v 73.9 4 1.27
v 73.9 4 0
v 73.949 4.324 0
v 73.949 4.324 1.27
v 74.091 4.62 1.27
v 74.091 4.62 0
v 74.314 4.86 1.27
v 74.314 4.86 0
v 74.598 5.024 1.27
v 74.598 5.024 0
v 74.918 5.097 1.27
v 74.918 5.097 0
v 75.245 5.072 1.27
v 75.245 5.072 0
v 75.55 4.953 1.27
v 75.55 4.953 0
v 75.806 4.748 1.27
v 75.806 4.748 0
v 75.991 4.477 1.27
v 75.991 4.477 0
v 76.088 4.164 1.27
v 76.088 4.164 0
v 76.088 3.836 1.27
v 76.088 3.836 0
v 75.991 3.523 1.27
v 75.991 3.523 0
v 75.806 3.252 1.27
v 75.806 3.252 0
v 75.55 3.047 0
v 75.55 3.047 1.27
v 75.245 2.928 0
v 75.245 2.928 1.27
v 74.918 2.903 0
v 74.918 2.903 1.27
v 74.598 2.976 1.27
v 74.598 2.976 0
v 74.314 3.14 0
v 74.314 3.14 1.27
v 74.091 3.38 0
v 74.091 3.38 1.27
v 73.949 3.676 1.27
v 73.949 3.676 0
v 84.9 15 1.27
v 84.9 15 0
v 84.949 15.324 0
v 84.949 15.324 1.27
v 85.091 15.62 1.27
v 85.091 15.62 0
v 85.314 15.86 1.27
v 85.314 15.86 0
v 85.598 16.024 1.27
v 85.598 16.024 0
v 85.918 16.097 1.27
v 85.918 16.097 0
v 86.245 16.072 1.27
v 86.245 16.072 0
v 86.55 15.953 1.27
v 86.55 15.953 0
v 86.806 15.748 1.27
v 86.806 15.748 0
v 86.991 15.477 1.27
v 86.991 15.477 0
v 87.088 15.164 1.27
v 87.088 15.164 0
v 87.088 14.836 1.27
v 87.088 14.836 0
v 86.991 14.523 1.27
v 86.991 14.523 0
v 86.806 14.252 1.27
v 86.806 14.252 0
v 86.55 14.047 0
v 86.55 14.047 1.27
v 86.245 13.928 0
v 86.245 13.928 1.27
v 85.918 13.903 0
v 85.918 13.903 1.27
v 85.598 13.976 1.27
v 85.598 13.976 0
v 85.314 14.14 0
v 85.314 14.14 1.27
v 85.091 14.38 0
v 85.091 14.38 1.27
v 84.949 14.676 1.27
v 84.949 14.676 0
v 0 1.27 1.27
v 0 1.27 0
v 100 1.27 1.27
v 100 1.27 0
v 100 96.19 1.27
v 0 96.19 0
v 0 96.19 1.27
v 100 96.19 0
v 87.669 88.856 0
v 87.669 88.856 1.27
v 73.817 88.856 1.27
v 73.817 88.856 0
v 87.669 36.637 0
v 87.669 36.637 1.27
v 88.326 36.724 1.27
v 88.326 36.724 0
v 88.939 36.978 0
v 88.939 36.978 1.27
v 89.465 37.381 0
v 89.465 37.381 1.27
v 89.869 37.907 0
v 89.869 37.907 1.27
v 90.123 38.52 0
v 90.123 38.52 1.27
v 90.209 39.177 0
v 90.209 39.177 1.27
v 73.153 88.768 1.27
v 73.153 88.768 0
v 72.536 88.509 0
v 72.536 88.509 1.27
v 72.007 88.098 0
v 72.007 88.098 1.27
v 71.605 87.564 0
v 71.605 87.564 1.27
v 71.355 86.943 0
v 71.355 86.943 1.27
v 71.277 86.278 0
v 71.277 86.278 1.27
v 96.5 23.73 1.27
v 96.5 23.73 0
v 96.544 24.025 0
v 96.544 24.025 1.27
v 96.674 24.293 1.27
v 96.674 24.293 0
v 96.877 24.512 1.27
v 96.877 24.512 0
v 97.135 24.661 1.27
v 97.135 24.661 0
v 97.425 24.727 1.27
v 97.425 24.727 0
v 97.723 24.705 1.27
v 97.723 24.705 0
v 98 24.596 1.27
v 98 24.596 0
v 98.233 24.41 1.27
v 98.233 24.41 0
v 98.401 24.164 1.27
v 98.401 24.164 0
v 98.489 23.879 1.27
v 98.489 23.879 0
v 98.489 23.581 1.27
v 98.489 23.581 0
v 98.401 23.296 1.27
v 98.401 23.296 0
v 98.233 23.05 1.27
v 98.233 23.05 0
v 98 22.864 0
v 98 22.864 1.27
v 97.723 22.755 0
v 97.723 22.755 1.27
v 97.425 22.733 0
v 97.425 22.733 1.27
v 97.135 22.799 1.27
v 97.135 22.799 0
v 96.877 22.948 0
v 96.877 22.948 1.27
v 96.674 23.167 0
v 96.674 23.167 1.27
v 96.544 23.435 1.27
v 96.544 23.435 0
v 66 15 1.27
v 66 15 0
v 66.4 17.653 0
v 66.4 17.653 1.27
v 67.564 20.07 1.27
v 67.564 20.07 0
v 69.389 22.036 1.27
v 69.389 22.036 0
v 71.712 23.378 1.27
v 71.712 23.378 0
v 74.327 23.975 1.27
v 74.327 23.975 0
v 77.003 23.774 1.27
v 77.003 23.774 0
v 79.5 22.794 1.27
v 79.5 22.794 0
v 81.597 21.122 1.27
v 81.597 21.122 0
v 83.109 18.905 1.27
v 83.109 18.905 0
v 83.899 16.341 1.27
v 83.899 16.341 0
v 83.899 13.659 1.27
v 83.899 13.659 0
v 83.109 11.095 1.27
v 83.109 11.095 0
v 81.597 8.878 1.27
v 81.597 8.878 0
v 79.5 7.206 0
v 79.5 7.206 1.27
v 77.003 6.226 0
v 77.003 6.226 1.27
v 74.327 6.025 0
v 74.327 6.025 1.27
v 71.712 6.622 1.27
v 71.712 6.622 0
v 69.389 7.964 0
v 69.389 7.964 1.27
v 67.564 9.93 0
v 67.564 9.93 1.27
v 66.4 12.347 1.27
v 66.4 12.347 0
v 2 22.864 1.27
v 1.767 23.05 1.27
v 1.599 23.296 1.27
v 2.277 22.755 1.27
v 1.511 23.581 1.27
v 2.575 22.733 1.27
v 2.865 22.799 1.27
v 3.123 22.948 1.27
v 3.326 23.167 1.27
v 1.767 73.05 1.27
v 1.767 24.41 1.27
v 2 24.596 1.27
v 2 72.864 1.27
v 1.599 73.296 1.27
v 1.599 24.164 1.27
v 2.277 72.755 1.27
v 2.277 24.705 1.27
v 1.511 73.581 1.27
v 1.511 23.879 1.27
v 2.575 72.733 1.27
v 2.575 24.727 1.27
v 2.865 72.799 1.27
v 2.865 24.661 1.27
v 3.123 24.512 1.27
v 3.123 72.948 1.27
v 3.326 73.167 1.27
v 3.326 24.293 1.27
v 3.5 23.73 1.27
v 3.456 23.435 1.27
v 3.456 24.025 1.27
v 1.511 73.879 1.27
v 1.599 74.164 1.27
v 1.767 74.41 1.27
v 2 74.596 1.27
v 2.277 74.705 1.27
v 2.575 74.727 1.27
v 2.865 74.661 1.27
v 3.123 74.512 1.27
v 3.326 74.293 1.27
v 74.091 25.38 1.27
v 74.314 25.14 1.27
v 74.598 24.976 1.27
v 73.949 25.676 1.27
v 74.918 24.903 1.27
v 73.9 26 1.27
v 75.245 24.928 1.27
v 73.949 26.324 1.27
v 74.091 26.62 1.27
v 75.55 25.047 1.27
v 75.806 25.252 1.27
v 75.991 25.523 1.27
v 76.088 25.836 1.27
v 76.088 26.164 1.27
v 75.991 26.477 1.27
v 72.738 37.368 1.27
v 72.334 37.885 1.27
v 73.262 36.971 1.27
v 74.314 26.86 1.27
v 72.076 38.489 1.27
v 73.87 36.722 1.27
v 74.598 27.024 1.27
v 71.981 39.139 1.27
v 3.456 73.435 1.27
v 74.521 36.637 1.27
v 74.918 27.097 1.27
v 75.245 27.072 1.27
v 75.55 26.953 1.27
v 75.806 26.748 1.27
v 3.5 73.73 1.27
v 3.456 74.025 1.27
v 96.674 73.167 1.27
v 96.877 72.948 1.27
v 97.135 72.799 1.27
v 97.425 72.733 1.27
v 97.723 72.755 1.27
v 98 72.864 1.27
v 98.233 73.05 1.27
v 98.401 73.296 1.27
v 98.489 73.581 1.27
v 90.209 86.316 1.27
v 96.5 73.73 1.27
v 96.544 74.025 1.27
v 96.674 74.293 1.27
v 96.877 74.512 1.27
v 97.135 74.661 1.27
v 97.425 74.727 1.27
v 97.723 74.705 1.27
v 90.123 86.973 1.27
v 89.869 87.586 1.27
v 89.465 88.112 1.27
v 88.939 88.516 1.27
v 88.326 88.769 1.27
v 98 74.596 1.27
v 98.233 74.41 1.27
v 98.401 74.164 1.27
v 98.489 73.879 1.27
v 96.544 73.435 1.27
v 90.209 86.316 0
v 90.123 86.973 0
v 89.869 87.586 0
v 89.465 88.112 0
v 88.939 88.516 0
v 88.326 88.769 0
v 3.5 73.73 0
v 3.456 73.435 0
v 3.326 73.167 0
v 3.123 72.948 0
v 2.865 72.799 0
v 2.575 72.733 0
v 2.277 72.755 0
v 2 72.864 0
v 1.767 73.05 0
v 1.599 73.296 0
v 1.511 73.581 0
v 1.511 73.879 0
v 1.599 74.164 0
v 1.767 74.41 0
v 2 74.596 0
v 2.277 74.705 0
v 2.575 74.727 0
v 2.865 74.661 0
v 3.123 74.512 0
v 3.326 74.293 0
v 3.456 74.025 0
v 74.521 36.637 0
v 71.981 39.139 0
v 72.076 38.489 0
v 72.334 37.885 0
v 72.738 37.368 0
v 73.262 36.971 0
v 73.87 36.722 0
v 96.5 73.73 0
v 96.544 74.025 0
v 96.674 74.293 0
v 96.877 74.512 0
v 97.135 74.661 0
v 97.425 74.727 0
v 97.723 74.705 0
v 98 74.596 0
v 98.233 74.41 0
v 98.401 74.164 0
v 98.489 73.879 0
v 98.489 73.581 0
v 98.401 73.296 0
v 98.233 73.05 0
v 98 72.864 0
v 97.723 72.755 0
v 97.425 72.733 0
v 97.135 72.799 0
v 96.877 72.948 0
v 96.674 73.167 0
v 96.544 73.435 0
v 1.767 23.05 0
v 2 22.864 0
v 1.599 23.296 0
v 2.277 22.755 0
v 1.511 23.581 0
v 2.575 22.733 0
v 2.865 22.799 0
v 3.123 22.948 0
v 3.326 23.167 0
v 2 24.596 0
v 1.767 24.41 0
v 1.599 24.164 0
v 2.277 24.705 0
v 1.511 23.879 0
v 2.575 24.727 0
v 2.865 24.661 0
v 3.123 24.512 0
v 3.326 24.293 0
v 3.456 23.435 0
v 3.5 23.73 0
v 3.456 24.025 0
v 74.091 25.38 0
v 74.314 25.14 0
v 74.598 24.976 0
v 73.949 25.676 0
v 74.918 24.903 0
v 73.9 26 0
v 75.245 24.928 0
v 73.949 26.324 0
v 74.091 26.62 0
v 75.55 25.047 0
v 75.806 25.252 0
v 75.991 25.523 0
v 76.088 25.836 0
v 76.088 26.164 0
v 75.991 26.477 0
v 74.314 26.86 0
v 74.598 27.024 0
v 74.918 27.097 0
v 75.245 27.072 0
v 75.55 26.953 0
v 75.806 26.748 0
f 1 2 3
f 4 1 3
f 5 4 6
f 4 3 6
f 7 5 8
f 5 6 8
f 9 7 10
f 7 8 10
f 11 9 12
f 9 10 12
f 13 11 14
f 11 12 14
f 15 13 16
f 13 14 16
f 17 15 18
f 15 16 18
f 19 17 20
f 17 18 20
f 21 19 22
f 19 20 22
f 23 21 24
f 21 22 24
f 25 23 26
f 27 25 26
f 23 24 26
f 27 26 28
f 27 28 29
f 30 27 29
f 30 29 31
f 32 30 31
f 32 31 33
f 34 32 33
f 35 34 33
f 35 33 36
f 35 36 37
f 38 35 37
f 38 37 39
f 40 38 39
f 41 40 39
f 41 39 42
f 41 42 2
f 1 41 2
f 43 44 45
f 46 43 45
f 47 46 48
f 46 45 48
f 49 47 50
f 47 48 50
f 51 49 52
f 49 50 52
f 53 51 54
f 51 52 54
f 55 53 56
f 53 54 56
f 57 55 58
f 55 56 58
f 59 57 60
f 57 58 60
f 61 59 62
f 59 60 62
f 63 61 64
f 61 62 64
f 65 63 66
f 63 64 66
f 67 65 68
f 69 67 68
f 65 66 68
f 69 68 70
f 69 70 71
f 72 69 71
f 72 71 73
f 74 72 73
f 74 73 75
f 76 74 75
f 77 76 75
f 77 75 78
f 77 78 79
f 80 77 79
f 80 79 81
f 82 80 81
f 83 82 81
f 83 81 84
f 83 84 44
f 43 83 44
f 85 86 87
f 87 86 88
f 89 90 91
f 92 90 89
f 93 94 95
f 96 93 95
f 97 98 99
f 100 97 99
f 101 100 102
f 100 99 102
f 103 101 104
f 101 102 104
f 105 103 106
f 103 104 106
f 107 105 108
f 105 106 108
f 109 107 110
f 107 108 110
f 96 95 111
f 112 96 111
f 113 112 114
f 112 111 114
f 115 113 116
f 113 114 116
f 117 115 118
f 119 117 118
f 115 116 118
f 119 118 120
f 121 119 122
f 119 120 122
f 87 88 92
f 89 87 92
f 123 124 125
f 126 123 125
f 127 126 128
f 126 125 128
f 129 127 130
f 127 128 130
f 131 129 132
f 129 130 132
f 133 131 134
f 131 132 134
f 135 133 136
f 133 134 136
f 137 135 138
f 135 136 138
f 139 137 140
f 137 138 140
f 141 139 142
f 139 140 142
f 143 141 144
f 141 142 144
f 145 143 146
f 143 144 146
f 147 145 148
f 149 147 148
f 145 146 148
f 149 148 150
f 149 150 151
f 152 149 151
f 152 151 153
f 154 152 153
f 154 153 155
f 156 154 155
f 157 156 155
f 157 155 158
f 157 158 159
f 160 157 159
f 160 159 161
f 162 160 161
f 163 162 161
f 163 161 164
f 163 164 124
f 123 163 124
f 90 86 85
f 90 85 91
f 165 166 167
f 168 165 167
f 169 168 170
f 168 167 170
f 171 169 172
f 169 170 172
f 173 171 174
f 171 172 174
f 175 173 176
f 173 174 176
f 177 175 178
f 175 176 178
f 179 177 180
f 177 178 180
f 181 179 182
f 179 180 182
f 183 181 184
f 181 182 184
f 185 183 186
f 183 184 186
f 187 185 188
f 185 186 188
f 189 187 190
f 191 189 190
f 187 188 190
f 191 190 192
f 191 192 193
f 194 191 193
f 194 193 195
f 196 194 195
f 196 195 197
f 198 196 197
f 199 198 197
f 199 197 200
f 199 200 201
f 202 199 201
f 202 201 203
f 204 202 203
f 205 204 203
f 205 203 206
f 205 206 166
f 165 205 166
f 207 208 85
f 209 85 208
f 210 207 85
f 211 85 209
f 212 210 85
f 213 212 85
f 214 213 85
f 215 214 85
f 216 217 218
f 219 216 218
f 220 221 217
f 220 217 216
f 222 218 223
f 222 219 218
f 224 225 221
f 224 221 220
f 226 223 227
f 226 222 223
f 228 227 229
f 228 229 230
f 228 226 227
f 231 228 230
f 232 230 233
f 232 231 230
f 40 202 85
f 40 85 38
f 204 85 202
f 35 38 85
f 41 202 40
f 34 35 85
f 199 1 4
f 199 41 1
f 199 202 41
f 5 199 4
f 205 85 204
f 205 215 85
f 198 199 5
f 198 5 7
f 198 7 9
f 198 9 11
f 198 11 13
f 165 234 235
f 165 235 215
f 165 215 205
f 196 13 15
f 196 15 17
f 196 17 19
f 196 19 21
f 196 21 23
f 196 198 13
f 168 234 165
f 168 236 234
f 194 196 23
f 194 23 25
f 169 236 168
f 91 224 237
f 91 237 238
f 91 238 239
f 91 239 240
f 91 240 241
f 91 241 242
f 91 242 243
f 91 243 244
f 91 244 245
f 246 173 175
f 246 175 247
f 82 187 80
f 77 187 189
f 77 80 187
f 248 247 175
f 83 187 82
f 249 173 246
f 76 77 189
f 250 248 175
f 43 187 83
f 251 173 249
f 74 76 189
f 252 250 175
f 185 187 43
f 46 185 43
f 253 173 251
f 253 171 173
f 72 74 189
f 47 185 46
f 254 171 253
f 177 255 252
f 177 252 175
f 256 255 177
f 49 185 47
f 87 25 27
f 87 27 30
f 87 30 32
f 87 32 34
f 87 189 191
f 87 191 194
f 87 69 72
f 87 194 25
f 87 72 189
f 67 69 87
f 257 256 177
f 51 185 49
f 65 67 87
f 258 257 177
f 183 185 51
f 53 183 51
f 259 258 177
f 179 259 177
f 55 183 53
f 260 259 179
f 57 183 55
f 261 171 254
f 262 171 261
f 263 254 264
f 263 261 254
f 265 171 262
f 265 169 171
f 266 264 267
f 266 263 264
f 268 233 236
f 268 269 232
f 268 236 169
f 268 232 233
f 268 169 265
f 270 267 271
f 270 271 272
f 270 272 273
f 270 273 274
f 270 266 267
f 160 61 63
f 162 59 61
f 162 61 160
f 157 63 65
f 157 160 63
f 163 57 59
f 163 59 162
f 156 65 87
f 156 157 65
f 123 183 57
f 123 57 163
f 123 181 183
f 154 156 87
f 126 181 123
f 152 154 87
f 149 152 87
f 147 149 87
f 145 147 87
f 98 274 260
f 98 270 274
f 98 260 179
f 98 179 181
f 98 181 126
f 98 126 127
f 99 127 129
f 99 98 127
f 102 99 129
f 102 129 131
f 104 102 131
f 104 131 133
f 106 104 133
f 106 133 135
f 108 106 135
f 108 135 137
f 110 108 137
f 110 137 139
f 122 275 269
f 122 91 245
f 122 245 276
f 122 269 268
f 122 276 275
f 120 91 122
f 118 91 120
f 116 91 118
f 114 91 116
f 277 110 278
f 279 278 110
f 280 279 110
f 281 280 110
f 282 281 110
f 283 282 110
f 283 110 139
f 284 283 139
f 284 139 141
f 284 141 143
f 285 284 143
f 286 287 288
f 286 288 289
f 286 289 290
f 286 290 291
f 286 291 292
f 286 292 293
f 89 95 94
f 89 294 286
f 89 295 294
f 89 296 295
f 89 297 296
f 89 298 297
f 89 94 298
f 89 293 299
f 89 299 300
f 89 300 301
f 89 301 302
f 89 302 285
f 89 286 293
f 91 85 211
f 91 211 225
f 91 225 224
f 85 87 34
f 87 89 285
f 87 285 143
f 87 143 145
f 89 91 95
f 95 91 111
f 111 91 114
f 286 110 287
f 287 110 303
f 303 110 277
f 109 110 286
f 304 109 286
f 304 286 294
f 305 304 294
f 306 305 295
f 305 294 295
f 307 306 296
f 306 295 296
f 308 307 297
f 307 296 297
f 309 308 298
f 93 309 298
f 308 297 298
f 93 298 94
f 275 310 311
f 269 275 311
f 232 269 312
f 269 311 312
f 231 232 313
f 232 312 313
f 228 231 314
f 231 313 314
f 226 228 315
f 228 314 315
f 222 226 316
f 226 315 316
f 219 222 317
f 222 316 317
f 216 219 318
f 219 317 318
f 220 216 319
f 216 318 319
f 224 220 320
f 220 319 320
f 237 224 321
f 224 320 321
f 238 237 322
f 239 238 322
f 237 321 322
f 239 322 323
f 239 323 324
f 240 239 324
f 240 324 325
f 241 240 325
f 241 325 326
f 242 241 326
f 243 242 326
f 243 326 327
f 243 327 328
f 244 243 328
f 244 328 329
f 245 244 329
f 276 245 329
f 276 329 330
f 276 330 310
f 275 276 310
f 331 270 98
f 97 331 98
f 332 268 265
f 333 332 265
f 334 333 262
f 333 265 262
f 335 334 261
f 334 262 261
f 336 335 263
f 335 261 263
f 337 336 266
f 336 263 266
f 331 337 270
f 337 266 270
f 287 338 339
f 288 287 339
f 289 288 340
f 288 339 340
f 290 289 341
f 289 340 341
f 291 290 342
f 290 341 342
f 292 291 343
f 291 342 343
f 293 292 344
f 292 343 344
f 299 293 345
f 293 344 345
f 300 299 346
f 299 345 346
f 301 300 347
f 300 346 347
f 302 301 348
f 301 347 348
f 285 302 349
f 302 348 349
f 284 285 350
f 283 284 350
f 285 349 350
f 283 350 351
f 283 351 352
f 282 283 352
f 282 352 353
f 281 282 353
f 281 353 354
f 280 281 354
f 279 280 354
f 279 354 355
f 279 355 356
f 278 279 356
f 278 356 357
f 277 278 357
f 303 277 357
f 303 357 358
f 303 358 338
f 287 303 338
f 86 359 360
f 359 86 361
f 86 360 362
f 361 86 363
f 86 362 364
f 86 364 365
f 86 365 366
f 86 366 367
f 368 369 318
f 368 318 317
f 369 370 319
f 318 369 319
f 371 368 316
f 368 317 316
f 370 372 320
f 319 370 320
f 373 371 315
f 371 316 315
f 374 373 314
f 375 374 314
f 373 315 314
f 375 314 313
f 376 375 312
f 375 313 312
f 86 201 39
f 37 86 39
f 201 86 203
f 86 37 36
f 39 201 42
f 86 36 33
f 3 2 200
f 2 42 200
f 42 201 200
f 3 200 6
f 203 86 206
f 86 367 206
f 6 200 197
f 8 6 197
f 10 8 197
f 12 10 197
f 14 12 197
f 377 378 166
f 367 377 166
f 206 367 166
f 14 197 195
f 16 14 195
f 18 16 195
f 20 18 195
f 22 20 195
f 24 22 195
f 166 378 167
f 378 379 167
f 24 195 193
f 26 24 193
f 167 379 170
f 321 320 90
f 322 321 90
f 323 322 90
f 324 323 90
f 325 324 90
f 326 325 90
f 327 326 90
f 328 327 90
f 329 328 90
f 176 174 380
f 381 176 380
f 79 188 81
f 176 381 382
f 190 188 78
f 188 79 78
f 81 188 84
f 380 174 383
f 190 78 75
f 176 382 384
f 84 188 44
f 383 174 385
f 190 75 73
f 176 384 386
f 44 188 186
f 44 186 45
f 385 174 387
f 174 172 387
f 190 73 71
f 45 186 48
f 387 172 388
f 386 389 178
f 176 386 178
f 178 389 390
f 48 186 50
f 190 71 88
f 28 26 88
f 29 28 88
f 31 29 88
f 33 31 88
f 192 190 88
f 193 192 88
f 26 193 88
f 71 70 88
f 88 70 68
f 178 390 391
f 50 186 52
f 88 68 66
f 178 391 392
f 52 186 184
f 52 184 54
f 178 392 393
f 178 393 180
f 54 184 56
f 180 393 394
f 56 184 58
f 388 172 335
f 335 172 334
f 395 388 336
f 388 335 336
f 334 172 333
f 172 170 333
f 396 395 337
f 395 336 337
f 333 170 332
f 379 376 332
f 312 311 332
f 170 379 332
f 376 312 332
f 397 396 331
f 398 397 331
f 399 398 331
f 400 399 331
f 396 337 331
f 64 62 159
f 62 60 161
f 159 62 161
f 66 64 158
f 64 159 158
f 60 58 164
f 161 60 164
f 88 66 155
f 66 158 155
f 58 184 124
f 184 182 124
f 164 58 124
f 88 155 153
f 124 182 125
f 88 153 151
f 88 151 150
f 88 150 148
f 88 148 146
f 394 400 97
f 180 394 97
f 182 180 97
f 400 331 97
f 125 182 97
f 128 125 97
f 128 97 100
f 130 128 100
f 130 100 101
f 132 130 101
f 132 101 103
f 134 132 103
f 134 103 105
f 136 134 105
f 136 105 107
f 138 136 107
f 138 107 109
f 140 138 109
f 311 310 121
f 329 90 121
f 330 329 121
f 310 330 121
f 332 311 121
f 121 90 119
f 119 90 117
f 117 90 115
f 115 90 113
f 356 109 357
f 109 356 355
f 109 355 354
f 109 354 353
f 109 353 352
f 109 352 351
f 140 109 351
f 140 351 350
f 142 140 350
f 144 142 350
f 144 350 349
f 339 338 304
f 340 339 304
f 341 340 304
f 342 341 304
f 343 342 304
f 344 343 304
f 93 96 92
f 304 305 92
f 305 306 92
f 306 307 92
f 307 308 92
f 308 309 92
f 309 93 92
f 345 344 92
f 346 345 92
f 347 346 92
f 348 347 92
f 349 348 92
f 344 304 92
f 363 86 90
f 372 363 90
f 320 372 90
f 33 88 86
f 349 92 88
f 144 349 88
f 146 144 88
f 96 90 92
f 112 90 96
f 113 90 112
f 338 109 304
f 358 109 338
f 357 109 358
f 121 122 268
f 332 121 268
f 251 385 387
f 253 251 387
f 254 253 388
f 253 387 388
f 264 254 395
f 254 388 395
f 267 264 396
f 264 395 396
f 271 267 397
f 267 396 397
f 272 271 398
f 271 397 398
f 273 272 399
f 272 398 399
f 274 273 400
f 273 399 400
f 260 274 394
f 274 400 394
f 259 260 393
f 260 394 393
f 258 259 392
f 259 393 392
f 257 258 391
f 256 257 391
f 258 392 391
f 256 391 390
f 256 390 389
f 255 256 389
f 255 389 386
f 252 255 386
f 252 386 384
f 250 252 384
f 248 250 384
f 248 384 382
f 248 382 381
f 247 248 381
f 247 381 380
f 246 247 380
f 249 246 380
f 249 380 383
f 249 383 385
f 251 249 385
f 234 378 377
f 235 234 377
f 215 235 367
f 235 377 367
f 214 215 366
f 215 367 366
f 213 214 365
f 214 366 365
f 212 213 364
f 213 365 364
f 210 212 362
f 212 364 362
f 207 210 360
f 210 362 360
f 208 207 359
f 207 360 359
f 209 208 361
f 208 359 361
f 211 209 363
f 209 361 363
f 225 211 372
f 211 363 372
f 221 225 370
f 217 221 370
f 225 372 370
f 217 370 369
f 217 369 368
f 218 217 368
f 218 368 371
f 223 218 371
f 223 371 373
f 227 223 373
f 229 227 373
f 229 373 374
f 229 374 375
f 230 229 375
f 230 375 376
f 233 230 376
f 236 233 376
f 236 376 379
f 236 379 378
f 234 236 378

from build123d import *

# Parameters (mm, degrees)
SKETCH1_W           = 100
SKETCH1_H           = 94.92
BOSS_EXTRUDE1_DEPTH = 1.27
SKETCH14_R          = 9
SKETCH14_R_2        = 8
SKETCH14_R_3        = 6
SKETCH14_R_4        = 1.1
CUT_EXTRUDE8_DEPTH  = 5
SKETCH15_R          = 1
CUT_EXTRUDE9_DEPTH  = 10
CUT_EXTRUDE11_DEPTH = 2.54


with BuildPart() as part:
    # Sketch1 → Boss-Extrude1 (new body)
    with BuildSketch(Plane.XY):
        with Locations((50, 48.73)):
            Rectangle(SKETCH1_W, SKETCH1_H)
    extrude(amount=BOSS_EXTRUDE1_DEPTH)

    # Sketch14 → Cut-Extrude8 (cut)
    with BuildSketch(Plane(origin=(0, 0, 0), x_dir=(-1, 0, 0), z_dir=(0, 0, -1))):
        with Locations((-75, 15)):
            Circle(SKETCH14_R)
        with Locations((-75, 15)):
            Circle(SKETCH14_R_2, mode=Mode.SUBTRACT)
        with Locations((-75, 15)):
            Circle(SKETCH14_R_2)
        with Locations((-75, 15)):
            Circle(SKETCH14_R_3, mode=Mode.SUBTRACT)
        with Locations((-75, 15)):
            Circle(SKETCH14_R_3)
        with Locations((-75, 26)):
            Circle(SKETCH14_R_4)
        with Locations((-86, 15)):
            Circle(SKETCH14_R_4)
        with Locations((-75, 4)):
            Circle(SKETCH14_R_4)
    extrude(amount=-CUT_EXTRUDE8_DEPTH, mode=Mode.SUBTRACT)

    # Sketch15 → Cut-Extrude9 (cut)
    with BuildSketch(Plane(origin=(0, 0, 0), x_dir=(-1, 0, 0), z_dir=(0, 0, -1))):
        with Locations(Location((-2.5, 73.73, 0), (0, 0, 180))):
            Circle(SKETCH15_R)
        with Locations(Location((-2.5, 23.73, 0), (0, 0, 180))):
            Circle(SKETCH15_R)
        with Locations((-97.5, 23.73)):
            Circle(SKETCH15_R)
        with Locations((-97.5, 73.73)):
            Circle(SKETCH15_R)
    extrude(amount=-CUT_EXTRUDE9_DEPTH, mode=Mode.SUBTRACT)

    # Sketch18 → Cut-Extrude11 (cut)
    with BuildSketch(Plane.XY.offset(1.27)):
        with BuildLine():
            Line((87.669088652, 88.855847161), (73.816841533, 88.855847161))
            ThreePointArc((73.816841533, 88.855847161), (72.007429626, 88.098437566), (71.277124758, 86.277916888))
            Line((71.277124758, 86.277916888), (71.981132893, 39.139282942))
            ThreePointArc((71.981132893, 39.139282942), (72.738259262, 37.367801309), (74.520849667, 36.637213215))
            Line((74.520849667, 36.637213215), (87.669088652, 36.637213215))
            ThreePointArc((87.669088652, 36.637213215), (89.465139876, 37.381161991), (90.209088652, 39.177213215))
            Line((90.209088652, 39.177213215), (90.209088652, 86.315847161))
            ThreePointArc((90.209088652, 86.315847161), (89.465139876, 88.111898385), (87.669088652, 88.855847161))
        make_face()
    extrude(amount=-CUT_EXTRUDE11_DEPTH, mode=Mode.SUBTRACT)


solid = part.part
